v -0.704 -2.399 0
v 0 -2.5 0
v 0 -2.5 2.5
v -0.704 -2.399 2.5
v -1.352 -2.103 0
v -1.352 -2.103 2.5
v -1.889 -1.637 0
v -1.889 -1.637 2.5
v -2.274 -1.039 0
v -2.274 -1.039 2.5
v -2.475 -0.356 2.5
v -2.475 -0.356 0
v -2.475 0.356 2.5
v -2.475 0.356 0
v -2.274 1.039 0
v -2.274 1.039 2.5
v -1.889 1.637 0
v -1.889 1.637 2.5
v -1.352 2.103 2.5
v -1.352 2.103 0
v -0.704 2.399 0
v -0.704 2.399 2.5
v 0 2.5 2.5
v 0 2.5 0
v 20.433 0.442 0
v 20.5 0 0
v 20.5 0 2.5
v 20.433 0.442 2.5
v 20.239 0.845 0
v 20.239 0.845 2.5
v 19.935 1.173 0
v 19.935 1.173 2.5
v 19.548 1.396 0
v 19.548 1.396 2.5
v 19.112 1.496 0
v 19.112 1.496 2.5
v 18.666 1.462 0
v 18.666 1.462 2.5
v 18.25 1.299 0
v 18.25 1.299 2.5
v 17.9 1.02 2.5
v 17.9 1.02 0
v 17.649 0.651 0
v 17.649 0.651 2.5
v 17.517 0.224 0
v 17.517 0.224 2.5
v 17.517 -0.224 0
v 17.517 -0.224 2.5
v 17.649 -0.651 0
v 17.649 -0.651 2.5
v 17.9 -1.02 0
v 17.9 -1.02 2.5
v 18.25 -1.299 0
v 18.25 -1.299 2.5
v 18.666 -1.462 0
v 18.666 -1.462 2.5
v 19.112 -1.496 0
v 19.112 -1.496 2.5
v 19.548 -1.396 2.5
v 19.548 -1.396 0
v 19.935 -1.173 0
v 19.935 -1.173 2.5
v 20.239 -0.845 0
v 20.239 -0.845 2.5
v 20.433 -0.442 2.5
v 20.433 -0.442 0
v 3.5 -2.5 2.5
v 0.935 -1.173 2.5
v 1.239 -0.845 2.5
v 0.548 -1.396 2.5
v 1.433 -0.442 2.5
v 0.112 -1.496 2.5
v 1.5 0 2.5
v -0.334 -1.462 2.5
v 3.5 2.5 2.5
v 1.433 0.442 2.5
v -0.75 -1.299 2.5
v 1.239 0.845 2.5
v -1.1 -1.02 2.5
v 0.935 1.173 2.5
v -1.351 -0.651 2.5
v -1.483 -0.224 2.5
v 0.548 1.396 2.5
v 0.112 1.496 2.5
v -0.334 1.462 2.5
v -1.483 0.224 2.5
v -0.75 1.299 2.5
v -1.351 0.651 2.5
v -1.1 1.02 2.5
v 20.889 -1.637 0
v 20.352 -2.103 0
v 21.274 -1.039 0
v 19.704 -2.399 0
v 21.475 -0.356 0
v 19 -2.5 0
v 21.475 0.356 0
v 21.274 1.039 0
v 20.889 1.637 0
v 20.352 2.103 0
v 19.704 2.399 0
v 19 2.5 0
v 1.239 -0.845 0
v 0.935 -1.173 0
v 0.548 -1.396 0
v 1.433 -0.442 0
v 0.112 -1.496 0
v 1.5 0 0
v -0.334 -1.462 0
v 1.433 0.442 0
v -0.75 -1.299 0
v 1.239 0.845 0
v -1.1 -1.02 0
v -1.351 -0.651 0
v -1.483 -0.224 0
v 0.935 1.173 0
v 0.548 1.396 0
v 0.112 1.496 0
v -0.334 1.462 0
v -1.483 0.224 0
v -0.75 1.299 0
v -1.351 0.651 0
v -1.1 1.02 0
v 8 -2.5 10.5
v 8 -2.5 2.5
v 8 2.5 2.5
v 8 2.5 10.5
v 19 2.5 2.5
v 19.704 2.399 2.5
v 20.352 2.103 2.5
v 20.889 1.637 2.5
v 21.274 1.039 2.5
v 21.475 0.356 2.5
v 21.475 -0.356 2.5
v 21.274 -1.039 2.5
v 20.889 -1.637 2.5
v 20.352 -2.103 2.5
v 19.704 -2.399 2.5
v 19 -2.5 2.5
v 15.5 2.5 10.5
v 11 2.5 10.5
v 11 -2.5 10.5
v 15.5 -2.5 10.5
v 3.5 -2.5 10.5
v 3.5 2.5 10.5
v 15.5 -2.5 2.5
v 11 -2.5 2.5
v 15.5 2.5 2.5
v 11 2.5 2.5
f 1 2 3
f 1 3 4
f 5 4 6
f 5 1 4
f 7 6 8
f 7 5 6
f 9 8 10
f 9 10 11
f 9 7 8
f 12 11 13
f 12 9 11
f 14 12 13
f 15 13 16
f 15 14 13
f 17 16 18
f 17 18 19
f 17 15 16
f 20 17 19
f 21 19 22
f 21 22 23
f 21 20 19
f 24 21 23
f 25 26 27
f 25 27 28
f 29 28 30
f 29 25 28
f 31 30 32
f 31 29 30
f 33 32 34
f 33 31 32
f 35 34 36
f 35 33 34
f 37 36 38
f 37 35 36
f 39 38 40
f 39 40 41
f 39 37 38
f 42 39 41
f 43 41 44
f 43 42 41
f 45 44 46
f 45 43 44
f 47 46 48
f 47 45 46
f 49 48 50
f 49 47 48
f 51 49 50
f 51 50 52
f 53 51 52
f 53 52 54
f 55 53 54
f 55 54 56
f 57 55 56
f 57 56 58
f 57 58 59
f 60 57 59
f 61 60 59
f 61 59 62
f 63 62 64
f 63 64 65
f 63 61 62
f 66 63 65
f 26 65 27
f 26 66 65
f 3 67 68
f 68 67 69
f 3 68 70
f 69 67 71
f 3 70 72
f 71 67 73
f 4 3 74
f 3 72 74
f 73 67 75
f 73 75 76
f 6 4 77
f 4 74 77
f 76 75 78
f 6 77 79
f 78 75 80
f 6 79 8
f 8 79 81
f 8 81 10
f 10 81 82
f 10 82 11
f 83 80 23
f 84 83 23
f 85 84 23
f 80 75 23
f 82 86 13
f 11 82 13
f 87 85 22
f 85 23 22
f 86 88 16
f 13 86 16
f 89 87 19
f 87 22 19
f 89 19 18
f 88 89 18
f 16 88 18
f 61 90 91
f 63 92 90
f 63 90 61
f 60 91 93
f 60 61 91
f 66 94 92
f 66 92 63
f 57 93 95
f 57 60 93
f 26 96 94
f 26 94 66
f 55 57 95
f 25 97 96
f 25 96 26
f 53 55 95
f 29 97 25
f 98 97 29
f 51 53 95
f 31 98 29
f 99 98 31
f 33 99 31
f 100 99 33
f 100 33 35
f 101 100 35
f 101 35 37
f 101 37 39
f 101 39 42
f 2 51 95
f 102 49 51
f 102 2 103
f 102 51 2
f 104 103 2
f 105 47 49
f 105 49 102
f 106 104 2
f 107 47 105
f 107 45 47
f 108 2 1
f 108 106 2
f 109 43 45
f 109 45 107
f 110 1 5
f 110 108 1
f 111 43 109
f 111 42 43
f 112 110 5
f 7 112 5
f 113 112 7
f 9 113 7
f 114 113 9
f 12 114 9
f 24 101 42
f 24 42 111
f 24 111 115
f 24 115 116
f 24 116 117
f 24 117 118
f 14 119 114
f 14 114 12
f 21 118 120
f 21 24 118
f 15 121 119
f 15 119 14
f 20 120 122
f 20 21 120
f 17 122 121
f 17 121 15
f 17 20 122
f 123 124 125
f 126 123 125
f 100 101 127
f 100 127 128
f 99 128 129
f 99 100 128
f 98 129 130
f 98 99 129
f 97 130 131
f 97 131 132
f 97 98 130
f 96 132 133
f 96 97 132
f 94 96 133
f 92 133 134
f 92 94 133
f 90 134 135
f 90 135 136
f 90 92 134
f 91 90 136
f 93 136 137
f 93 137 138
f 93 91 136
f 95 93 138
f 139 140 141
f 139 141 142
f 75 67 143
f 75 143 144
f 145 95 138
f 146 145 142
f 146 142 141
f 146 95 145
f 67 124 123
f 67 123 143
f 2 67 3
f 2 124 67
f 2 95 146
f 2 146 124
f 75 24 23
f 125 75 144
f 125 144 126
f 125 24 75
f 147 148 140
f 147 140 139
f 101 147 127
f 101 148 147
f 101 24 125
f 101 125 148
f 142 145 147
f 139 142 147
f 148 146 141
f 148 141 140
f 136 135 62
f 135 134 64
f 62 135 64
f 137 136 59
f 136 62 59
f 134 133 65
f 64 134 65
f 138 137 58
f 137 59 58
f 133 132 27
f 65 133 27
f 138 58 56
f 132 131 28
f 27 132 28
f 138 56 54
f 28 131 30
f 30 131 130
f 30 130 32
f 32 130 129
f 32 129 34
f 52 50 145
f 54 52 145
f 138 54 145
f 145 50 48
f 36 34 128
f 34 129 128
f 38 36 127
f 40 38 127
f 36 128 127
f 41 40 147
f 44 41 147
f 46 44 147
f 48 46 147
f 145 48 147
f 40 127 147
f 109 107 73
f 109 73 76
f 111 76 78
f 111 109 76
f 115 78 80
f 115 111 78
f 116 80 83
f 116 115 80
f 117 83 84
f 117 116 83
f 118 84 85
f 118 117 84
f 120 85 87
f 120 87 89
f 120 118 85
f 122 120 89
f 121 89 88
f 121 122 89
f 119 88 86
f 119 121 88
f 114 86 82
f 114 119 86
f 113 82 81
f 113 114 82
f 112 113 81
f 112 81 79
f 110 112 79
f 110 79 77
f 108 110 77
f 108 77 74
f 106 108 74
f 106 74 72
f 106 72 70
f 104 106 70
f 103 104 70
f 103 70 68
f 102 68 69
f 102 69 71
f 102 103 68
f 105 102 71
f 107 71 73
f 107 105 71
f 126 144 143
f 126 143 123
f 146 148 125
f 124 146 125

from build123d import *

# Parameters (mm, degrees)
SKETCH_1_R      = 1.5
EXTRUDE_1_DEPTH = 2.5
SKETCH_2_W      = 4.5
SKETCH_2_H      = 5
EXTRUDE_2_DEPTH = 8


with BuildPart() as part:
    # ｽｹｯﾁ1 → ﾎﾞｽ - 押し出し1 (new body)
    with BuildSketch(Plane.XY):
        with BuildLine():
            Line((0, 2.5), (19, 2.5))
            ThreePointArc((19, 2.5), (21.5, 0), (19, -2.5))
            Line((19, -2.5), (0, -2.5))
            ThreePointArc((0, -2.5), (-2.5, 0), (0, 2.5))
        make_face()
        Circle(SKETCH_1_R, mode=Mode.SUBTRACT)
        with Locations((19, 0)):
            Circle(SKETCH_1_R, mode=Mode.SUBTRACT)
    extrude(amount=EXTRUDE_1_DEPTH)

    # ｽｹｯﾁ2 → ﾎﾞｽ - 押し出し2 (add)
    with BuildSketch(Plane.XY.offset(2.5)):
        with Locations((5.75, 0)):
            Rectangle(SKETCH_2_W, SKETCH_2_H)
        with Locations((13.25, 0)):
            Rectangle(SKETCH_2_W, SKETCH_2_H)
    extrude(amount=EXTRUDE_2_DEPTH)


solid = part.part
